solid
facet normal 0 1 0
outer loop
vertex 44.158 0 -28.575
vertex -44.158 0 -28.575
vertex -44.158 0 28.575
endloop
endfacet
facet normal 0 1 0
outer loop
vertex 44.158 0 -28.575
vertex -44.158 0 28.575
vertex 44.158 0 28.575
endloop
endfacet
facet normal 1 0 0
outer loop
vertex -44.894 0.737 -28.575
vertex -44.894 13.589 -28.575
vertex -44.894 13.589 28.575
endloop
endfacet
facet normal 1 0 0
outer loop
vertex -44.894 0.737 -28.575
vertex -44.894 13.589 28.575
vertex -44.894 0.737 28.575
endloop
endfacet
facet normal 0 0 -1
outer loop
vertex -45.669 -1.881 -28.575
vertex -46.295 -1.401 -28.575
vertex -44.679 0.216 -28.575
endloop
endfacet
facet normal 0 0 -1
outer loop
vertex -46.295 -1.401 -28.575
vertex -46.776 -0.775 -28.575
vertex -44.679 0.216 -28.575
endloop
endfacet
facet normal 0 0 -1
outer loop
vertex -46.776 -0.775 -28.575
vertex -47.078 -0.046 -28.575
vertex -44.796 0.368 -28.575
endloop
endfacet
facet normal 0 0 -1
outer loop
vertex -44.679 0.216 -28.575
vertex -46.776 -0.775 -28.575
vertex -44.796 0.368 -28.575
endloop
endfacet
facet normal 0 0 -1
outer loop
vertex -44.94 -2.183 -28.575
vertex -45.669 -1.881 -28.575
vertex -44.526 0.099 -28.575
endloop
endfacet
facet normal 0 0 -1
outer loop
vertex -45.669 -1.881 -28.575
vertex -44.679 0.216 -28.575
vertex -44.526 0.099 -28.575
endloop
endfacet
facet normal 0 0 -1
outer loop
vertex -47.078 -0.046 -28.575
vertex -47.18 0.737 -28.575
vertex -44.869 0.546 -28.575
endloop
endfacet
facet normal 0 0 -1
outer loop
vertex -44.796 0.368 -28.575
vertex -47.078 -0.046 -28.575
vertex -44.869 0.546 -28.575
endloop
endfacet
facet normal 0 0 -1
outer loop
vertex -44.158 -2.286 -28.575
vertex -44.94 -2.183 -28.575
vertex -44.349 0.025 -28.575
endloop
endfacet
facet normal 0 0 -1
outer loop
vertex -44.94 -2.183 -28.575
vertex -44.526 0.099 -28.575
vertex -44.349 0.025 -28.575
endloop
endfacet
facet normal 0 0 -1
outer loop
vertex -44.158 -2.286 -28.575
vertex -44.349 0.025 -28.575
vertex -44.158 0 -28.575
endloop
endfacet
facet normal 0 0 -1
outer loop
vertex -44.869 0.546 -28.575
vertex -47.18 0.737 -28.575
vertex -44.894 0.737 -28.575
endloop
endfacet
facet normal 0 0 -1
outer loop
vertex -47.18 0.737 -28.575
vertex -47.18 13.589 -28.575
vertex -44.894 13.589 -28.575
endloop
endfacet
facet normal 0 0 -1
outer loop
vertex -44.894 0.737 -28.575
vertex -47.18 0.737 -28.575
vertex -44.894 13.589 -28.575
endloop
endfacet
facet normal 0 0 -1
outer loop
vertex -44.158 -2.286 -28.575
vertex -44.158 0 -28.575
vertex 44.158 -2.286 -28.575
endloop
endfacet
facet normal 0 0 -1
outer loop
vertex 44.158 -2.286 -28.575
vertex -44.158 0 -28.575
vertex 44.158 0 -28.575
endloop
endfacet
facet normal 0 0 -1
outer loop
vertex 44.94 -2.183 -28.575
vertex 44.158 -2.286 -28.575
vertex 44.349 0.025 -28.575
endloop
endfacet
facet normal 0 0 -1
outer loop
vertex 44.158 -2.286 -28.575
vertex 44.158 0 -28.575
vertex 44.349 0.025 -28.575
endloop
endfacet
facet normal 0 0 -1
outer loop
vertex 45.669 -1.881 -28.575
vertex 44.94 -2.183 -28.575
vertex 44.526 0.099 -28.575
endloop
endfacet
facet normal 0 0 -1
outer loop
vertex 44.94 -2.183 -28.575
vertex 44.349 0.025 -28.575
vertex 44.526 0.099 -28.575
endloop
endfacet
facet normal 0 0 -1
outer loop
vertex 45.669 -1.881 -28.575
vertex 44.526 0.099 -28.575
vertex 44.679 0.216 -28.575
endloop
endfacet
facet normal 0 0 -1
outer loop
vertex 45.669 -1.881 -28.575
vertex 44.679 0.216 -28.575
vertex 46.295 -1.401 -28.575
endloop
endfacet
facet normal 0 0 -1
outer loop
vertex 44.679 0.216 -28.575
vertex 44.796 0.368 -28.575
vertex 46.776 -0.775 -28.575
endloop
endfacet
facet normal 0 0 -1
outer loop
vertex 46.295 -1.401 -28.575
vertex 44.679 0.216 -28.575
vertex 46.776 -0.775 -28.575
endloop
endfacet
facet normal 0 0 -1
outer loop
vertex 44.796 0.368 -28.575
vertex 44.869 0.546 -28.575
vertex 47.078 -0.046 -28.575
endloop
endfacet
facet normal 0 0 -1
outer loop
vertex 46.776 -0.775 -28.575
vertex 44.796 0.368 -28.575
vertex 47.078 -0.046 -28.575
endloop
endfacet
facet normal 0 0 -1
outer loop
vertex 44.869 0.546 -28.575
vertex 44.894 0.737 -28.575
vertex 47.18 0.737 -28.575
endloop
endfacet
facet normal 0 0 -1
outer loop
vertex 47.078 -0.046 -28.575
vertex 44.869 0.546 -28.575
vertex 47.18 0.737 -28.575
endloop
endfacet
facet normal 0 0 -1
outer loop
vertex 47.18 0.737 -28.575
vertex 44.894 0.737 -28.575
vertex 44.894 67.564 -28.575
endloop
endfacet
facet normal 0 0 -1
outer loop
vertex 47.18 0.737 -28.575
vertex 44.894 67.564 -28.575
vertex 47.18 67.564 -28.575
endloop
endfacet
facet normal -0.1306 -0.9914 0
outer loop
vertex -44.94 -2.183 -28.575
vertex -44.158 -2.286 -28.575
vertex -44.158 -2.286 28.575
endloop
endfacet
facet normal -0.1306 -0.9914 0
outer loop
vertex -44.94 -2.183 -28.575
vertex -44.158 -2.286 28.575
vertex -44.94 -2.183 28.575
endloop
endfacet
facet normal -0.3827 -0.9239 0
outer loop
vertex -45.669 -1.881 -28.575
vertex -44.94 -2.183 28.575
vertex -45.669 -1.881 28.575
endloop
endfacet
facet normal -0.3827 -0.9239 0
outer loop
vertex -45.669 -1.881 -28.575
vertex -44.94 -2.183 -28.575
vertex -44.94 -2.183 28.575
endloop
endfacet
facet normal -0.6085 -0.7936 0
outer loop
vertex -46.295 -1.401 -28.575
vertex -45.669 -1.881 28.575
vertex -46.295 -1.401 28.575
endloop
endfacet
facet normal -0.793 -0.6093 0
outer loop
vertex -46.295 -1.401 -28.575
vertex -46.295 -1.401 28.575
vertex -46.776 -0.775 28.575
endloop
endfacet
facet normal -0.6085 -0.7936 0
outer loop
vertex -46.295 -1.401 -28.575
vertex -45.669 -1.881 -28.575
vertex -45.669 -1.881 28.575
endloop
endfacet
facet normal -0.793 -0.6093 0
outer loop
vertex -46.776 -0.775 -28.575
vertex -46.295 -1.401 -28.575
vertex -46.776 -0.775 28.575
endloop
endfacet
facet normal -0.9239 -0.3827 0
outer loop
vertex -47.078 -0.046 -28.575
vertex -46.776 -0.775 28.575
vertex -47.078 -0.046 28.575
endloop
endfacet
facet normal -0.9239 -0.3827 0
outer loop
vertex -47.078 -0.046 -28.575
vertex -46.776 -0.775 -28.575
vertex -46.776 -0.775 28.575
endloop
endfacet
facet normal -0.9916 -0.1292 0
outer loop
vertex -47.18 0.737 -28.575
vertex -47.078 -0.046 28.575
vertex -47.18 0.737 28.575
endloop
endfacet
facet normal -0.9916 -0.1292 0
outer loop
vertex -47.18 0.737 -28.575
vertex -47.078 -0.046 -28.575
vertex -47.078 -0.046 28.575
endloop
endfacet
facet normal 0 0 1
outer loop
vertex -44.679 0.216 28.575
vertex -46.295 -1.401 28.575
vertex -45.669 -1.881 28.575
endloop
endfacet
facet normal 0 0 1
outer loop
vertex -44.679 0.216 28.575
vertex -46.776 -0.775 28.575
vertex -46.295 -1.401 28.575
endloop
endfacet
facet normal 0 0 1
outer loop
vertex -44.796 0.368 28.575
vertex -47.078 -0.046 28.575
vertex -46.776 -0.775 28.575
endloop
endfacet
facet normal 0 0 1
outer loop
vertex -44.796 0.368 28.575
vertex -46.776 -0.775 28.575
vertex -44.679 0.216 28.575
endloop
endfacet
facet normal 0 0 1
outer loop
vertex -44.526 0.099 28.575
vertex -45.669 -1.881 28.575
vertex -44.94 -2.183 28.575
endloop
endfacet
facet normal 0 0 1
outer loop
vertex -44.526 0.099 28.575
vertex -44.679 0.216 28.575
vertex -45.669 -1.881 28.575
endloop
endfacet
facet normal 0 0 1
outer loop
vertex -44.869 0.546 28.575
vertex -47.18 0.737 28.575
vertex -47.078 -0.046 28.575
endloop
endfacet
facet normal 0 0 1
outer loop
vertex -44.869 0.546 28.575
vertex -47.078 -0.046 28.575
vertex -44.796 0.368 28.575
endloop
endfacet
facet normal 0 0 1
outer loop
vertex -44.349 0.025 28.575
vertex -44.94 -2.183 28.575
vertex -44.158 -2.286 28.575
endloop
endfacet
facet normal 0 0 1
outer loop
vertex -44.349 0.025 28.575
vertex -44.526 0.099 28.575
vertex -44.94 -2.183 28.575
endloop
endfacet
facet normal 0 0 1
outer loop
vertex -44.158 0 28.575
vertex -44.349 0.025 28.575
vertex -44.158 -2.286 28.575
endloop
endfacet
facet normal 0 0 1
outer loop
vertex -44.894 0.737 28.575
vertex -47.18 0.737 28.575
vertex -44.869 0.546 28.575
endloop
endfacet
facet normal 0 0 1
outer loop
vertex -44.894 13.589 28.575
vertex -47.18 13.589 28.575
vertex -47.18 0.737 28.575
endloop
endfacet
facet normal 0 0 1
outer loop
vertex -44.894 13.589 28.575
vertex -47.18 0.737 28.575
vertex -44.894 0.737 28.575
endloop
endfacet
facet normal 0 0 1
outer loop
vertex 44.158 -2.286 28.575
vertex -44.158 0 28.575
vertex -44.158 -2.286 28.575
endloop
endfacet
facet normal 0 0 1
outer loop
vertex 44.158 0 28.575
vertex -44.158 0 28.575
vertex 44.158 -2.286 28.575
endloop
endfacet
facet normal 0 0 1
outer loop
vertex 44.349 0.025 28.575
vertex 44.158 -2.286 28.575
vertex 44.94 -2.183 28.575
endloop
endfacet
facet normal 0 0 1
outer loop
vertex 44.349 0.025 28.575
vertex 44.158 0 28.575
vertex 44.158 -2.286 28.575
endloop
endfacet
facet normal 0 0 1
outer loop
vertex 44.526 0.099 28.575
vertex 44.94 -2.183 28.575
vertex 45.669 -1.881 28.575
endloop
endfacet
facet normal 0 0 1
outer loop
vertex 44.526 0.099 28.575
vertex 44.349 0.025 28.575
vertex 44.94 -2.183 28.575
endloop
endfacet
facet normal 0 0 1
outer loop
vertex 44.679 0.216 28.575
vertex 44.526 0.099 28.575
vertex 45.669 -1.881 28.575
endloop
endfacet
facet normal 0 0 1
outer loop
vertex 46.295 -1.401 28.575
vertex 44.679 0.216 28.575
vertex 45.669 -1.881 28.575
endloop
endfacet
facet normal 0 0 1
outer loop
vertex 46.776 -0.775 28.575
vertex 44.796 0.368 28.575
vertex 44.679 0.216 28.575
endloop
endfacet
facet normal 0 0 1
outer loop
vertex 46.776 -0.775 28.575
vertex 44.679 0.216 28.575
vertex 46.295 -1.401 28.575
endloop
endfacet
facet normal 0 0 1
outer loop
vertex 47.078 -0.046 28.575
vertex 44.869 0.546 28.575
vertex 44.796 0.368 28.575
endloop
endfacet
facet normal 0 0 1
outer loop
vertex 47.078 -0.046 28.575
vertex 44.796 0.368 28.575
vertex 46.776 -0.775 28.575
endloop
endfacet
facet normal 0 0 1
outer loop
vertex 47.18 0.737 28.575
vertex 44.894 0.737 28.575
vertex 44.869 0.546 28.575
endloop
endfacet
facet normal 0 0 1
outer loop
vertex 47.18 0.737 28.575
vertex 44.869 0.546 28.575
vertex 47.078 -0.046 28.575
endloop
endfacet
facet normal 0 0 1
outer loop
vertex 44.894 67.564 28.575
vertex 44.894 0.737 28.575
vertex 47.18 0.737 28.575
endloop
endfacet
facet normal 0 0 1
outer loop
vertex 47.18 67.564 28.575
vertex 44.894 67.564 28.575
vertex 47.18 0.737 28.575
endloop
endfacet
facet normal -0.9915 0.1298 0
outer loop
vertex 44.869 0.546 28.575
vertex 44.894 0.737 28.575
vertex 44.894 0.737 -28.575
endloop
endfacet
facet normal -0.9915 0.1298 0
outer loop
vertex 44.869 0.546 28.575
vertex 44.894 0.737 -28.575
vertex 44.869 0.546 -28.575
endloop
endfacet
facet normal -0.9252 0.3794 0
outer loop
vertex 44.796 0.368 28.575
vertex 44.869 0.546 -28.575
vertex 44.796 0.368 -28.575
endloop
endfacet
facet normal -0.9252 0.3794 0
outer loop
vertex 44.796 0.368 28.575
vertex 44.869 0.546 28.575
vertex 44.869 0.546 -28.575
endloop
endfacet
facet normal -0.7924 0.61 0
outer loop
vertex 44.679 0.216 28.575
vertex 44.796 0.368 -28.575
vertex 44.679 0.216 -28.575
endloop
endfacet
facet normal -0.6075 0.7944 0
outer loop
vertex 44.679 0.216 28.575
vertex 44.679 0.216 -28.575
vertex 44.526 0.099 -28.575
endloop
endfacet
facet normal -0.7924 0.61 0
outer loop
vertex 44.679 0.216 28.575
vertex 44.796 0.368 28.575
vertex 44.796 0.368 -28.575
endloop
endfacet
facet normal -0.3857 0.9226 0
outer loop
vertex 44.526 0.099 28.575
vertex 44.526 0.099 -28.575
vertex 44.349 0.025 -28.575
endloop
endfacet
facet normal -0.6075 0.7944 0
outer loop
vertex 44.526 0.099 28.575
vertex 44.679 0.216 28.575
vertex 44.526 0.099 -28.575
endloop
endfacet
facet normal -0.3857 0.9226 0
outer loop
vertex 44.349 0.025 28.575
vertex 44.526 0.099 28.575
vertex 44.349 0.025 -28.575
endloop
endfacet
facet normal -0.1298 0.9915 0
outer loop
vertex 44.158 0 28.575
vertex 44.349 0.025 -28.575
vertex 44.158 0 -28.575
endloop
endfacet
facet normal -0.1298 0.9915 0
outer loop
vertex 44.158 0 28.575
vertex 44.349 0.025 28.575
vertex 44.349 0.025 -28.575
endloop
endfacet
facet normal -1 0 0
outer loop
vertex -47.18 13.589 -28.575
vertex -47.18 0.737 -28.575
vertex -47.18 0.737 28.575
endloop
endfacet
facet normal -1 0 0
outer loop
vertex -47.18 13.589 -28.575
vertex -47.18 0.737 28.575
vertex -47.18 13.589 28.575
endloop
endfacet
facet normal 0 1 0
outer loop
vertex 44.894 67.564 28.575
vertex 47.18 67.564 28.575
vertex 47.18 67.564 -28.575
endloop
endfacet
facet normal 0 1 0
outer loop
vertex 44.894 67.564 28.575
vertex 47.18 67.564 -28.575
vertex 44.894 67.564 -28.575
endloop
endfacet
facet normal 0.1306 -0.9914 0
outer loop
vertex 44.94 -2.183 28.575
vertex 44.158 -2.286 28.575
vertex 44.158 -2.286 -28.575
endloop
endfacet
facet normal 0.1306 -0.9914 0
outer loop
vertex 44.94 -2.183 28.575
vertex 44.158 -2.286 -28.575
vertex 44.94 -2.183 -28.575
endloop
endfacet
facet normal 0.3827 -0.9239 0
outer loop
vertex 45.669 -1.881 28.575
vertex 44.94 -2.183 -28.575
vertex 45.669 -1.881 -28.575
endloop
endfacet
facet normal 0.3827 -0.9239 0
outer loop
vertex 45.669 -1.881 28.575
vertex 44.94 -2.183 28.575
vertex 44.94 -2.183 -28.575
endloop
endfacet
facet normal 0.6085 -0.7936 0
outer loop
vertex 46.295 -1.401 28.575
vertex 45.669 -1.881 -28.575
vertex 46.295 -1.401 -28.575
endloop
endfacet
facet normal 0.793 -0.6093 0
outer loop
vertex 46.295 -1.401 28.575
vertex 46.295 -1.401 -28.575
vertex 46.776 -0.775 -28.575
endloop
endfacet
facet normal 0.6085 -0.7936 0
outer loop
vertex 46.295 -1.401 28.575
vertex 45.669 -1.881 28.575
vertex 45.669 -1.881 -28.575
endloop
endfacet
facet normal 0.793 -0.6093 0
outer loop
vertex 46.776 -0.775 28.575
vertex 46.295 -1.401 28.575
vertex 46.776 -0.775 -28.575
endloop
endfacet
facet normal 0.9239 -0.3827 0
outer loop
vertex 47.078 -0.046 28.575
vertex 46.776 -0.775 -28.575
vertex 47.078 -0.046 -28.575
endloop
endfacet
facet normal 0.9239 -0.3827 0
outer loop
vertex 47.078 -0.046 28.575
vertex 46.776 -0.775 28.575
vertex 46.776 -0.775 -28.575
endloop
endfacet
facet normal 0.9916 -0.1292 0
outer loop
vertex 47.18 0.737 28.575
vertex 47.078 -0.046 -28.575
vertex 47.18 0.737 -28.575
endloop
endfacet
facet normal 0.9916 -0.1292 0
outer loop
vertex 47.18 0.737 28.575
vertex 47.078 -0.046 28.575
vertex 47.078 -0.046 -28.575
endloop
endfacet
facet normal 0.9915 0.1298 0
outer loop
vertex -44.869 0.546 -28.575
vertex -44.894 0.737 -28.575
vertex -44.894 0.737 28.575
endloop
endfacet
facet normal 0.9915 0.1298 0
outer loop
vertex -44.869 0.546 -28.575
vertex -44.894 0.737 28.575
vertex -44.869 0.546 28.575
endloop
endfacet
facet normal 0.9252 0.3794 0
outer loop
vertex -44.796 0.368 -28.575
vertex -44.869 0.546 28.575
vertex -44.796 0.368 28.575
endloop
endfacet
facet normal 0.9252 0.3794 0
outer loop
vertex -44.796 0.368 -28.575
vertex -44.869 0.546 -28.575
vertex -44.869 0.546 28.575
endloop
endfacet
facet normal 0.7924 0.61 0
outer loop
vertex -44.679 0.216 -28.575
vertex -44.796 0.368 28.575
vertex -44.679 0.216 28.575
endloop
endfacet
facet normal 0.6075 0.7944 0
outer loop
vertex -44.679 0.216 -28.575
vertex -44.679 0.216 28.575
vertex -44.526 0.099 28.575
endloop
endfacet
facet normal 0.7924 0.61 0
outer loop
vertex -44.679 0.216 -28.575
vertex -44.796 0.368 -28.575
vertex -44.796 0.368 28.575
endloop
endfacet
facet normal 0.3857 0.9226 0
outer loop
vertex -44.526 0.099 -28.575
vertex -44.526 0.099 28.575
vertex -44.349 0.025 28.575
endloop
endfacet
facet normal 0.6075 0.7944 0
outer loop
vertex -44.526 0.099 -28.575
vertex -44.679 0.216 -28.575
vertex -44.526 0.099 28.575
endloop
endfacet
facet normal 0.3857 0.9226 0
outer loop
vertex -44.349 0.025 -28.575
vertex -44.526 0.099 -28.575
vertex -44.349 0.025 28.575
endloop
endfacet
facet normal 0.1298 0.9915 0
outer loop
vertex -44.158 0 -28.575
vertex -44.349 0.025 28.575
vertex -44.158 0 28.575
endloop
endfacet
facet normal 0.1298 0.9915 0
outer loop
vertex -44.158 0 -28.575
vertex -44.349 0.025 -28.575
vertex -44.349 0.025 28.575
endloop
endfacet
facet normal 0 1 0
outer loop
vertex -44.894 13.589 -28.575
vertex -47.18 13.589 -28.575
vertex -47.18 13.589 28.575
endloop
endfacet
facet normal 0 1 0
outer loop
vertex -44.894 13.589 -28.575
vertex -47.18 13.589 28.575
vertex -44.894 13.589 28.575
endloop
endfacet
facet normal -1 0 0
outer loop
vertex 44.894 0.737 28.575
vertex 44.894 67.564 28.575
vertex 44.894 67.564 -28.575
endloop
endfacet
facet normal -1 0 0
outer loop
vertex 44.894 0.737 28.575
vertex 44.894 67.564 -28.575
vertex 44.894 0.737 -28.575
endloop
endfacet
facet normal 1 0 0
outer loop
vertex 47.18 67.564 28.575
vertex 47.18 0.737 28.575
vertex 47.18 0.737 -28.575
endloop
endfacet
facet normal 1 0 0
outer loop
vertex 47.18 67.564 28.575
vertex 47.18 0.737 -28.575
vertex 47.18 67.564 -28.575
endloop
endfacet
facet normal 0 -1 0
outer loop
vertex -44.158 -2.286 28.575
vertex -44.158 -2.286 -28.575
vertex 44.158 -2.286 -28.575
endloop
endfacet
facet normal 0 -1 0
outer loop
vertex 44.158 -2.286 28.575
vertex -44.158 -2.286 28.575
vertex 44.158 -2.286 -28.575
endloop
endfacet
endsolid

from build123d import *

# Parameters (mm, degrees)
SKETCH1_W                    = 94.361
SKETCH1_H                    = 57.15
BASE_FLANGE1_DEPTH           = 2.286
EDGE_FLANGE1_STRIP_W         = 10.6172
EDGE_FLANGE1_STRIP_H         = 2.286
EDGE_FLANGE1_STRIP_CUT_DEPTH = 57.15
EDGE_FLANGE1_DEPTH           = 57.15
EDGE_FLANGE2_STRIP_W         = 10.6172
EDGE_FLANGE2_STRIP_H         = 2.286
EDGE_FLANGE2_STRIP_CUT_DEPTH = 57.15
EDGE_FLANGE2_DEPTH           = 57.15


# Sheet-metal steps are written as plain solids
with BuildPart() as part:
    # Sketch1 → Base-Flange1 (new body)
    with BuildSketch(Plane(origin=(0, 0, 0), x_dir=(1, 0, 0), z_dir=(0, 1, 0))):
        Rectangle(SKETCH1_W, SKETCH1_H)
    extrude(amount=-BASE_FLANGE1_DEPTH)

    # Edge-Flange1 strip (across the edge) → Edge-Flange1 strip cut (cut)
    with BuildSketch(Plane(origin=(-47.1805, 0, -28.575), x_dir=(1, 0, 0), z_dir=(0, 0, 1))):
        with Locations((-2.286, -1.143)):
            Rectangle(EDGE_FLANGE1_STRIP_W, EDGE_FLANGE1_STRIP_H)
    extrude(amount=EDGE_FLANGE1_STRIP_CUT_DEPTH, mode=Mode.SUBTRACT)

    # Edge-Flange1 section (across the edge) → Edge-Flange1 (add)
    with BuildSketch(Plane(origin=(-47.1805, 0, -28.575), x_dir=(1, 0, 0), z_dir=(0, 0, 1))):
        with BuildLine():
            Line((0, 0.7366), (0, 13.589))
            Line((0, 13.589), (2.286, 13.589))
            Line((2.286, 13.589), (2.286, 0.7366))
            ThreePointArc((2.286, 0.7366), (2.501745145, 0.215745145), (3.0226, 0))
            Line((3.0226, 0), (3.0226, -2.286))
            ThreePointArc((3.0226, -2.286), (0.885299043, -1.400700957), (0, 0.7366))
        make_face()
    extrude(amount=EDGE_FLANGE1_DEPTH)

    # Edge-Flange2 strip (across the edge) → Edge-Flange2 strip cut (cut)
    with BuildSketch(Plane(origin=(47.1805, 0, 28.575), x_dir=(-1, 0, 0), z_dir=(0, 0, -1))):
        with Locations((-2.286, -1.143)):
            Rectangle(EDGE_FLANGE2_STRIP_W, EDGE_FLANGE2_STRIP_H)
    extrude(amount=EDGE_FLANGE2_STRIP_CUT_DEPTH, mode=Mode.SUBTRACT)

    # Edge-Flange2 section (across the edge) → Edge-Flange2 (add)
    with BuildSketch(Plane(origin=(47.1805, 0, 28.575), x_dir=(-1, 0, 0), z_dir=(0, 0, -1))):
        with BuildLine():
            Line((0, 0.7366), (0, 67.564))
            Line((0, 67.564), (2.286, 67.564))
            Line((2.286, 67.564), (2.286, 0.7366))
            ThreePointArc((2.286, 0.7366), (2.501745145, 0.215745145), (3.0226, 0))
            Line((3.0226, 0), (3.0226, -2.286))
            ThreePointArc((3.0226, -2.286), (0.885299043, -1.400700957), (0, 0.7366))
        make_face()
    extrude(amount=EDGE_FLANGE2_DEPTH)


solid = part.part
